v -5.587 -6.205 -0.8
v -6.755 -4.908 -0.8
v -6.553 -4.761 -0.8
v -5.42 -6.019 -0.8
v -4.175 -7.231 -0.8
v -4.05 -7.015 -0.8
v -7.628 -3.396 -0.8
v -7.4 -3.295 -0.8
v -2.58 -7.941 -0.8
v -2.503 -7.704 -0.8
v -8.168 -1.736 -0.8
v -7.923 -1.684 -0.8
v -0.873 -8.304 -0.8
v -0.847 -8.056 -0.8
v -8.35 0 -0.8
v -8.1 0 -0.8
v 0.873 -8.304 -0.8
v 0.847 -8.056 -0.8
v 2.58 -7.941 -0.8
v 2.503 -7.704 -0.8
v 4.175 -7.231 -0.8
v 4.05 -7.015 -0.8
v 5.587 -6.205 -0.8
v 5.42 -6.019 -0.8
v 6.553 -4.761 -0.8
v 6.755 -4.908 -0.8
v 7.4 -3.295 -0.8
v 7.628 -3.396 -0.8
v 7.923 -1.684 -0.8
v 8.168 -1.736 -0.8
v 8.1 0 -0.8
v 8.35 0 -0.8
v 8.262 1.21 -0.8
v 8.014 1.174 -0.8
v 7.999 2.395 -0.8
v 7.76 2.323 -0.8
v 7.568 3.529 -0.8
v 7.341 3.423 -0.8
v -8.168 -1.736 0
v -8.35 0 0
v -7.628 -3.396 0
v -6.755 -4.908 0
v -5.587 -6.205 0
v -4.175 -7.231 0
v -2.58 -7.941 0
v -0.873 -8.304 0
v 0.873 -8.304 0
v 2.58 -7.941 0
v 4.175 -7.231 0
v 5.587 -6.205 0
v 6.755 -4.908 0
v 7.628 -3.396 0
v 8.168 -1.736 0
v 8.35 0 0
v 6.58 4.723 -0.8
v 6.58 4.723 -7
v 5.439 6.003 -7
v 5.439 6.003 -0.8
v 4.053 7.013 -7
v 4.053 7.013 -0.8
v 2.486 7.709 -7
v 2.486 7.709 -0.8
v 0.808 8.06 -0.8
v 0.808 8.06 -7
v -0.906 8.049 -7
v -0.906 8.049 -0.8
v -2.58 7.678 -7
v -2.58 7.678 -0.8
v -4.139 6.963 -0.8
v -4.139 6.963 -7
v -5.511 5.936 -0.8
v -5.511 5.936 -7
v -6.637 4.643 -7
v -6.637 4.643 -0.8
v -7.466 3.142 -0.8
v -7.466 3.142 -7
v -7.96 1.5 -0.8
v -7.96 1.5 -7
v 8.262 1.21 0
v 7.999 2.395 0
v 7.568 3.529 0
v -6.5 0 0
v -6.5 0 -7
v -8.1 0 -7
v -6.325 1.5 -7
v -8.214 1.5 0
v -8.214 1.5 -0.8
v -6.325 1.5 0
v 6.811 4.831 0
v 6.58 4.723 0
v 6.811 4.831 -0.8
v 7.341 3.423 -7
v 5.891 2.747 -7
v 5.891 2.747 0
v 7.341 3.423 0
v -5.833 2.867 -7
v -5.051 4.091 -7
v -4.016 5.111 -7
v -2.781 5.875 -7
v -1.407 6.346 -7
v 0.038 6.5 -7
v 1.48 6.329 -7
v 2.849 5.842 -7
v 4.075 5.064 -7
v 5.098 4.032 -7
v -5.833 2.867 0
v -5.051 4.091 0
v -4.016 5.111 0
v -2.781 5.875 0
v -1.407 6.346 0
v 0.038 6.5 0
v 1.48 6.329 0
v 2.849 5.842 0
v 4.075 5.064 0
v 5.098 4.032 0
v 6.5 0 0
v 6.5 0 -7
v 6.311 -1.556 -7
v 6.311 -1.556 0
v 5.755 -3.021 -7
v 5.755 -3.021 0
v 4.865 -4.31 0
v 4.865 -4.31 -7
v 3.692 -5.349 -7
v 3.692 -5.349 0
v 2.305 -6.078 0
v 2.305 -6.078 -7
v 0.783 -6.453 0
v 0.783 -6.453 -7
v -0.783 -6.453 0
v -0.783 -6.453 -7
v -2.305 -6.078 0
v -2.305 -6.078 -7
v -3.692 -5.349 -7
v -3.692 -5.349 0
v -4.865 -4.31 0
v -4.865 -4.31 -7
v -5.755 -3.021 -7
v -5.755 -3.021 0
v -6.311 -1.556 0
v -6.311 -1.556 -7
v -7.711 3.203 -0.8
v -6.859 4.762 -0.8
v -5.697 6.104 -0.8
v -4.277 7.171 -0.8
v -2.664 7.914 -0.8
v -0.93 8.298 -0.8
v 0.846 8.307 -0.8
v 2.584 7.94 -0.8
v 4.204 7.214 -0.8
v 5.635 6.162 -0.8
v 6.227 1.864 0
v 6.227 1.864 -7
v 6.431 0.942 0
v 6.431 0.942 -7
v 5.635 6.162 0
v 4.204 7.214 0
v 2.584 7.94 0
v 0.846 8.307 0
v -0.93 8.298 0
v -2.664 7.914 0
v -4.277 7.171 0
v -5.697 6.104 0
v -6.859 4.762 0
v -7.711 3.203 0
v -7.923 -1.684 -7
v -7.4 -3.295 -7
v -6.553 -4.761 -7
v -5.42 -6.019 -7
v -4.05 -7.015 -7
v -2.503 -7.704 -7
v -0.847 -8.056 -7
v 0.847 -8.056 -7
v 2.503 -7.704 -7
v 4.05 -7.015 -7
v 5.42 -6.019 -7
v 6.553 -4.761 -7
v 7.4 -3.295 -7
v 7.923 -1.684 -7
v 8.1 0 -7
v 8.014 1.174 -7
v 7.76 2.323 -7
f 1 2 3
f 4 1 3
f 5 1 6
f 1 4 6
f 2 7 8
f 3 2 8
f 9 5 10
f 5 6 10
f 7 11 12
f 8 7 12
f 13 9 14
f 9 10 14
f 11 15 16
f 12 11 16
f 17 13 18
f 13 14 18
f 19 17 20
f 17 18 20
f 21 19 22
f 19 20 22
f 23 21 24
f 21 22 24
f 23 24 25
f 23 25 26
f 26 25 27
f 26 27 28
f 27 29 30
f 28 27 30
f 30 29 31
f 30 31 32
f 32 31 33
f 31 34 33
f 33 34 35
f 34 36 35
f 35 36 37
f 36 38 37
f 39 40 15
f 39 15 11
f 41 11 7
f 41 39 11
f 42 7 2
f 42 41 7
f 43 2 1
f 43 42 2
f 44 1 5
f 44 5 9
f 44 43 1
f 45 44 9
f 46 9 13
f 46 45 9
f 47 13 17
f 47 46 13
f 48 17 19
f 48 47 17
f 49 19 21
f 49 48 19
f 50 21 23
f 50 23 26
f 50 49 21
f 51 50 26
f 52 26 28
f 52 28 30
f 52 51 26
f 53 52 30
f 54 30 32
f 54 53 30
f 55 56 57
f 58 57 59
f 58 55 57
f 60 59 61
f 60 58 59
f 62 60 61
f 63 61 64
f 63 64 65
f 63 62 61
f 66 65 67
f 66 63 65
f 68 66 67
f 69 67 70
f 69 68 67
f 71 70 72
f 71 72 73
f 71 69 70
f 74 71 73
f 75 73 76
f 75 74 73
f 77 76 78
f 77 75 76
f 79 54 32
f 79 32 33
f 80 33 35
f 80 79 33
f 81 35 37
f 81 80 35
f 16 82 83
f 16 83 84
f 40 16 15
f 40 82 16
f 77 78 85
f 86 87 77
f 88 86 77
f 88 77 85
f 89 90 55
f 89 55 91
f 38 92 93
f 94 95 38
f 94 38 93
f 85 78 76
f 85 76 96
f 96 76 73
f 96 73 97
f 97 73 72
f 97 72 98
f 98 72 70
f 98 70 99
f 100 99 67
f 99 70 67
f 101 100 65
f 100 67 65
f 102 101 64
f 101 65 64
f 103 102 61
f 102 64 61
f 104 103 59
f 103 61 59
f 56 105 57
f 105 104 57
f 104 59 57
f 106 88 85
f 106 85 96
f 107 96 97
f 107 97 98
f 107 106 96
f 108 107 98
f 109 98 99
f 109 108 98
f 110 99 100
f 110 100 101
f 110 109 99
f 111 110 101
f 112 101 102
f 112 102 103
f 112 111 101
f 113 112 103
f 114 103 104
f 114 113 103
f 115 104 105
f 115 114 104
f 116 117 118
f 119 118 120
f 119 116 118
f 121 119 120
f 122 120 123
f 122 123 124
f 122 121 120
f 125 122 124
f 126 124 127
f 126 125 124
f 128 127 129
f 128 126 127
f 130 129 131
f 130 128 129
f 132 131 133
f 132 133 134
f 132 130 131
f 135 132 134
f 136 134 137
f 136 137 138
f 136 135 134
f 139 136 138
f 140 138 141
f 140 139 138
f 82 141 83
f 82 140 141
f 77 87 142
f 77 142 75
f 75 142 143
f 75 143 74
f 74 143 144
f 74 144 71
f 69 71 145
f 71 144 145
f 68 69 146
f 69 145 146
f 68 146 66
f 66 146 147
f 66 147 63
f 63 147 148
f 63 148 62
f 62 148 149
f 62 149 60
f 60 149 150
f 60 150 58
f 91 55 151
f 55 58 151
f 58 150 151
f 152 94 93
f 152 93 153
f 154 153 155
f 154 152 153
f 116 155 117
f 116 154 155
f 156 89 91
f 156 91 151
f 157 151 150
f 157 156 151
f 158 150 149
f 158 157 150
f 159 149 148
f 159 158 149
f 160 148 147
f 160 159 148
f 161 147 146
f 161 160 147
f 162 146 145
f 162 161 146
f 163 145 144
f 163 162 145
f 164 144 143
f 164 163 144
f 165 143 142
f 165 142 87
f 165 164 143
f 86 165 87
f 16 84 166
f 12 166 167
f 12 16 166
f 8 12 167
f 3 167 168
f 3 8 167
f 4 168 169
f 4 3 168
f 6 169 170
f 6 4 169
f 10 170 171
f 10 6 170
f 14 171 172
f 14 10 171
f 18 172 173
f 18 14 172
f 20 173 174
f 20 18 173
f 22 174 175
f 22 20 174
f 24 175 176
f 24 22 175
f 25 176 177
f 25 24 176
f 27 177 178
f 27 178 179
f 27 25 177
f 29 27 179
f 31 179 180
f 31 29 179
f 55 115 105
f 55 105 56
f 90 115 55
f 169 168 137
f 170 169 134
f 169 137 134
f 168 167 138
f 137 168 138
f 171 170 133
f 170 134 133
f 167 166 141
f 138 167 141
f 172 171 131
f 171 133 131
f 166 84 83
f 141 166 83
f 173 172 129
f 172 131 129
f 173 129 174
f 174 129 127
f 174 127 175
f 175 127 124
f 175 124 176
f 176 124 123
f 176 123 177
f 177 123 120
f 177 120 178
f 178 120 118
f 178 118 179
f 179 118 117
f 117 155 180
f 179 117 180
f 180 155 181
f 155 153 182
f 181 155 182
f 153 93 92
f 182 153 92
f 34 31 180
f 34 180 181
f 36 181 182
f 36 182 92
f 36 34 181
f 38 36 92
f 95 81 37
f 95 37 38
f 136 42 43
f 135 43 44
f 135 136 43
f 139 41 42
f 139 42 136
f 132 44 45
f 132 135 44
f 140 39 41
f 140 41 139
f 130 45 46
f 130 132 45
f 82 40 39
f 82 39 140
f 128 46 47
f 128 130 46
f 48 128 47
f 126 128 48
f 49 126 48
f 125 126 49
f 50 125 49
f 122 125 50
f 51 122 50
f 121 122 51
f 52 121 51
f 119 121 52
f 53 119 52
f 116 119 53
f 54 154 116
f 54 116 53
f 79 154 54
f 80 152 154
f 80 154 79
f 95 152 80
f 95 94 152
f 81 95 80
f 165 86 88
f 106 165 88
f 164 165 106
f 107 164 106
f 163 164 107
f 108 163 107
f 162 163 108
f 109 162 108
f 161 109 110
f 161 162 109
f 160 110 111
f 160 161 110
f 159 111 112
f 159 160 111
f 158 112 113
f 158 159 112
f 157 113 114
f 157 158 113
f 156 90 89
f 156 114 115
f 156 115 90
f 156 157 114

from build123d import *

# Parameters (mm, degrees)
F1_DEPTH = 7
F2_DEPTH = 0.8
F3_DEPTH = 7
F4_DEPTH = 0.8


with BuildPart() as f1:
    # F0 (on Top) → F1 (new body)
    with BuildSketch(Plane.XY):
        with BuildLine():
            ThreePointArc((8.1, 0), (7.9079976577, 1.7531608729), (7.341093075, 3.4232079201))
            Line((7.341093075, 3.4232079201), (5.8910006157, 2.7470187013))
            ThreePointArc((5.8910006157, 2.7470187013), (6.3459240463, 1.4068574906), (6.5, 0))
            ThreePointArc((6.5, 0), (0, -6.5), (-6.5, 0))
            Line((-6.5, 0), (-8.1, 0))
            ThreePointArc((-8.1, 0), (0, -8.1), (8.1, 0))
        make_face()
    extrude(amount=-F1_DEPTH)

    # F0 (on Top) → F2 (join)
    with BuildSketch(Plane.XY):
        with BuildLine():
            ThreePointArc((-8.35, 0), (0, -8.35), (8.35, 0))
            ThreePointArc((8.35, 0), (8.1520716595, 1.8072707764), (7.5676700218, 3.5288624855))
            Line((7.5676700218, 3.5288624855), (7.341093075, 3.4232079201))
            ThreePointArc((7.341093075, 3.4232079201), (7.9079976577, 1.7531608729), (8.1, 0))
            ThreePointArc((8.1, 0), (0, -8.1), (-8.1, 0))
            Line((-8.1, 0), (-8.35, 0))
        make_face()
    extrude(amount=-F2_DEPTH)


with BuildPart() as f3:
    # F0 (on Top) → F3 (new body)
    with BuildSketch(Plane.XY):
        with BuildLine():
            Line((5.0980663438, 4.0323342563), (6.5801915054, 4.7234605695))
            ThreePointArc((6.5801915054, 4.7234605695), (-1.7531608729, 7.9079976577), (-7.9598994969, 1.5))
            Line((-7.9598994969, 1.5), (-6.3245553203, 1.5))
            ThreePointArc((-6.3245553203, 1.5), (-1.4068574906, 6.3459240463), (5.0980663438, 4.0323342563))
        make_face()
    extrude(amount=-F3_DEPTH)

    # F0 (on Top) → F4 (join)
    with BuildSketch(Plane.XY):
        with BuildLine():
            Line((6.5801915054, 4.7234605695), (6.8106339442, 4.8309176435))
            ThreePointArc((6.8106339442, 4.8309176435), (-1.8072707764, 8.1520716595), (-8.2141645954, 1.5))
            Line((-8.2141645954, 1.5), (-7.9598994969, 1.5))
            ThreePointArc((-7.9598994969, 1.5), (-1.7531608729, 7.9079976577), (6.5801915054, 4.7234605695))
        make_face()
    extrude(amount=-F4_DEPTH)


solid = Compound([f1.part, f3.part])
